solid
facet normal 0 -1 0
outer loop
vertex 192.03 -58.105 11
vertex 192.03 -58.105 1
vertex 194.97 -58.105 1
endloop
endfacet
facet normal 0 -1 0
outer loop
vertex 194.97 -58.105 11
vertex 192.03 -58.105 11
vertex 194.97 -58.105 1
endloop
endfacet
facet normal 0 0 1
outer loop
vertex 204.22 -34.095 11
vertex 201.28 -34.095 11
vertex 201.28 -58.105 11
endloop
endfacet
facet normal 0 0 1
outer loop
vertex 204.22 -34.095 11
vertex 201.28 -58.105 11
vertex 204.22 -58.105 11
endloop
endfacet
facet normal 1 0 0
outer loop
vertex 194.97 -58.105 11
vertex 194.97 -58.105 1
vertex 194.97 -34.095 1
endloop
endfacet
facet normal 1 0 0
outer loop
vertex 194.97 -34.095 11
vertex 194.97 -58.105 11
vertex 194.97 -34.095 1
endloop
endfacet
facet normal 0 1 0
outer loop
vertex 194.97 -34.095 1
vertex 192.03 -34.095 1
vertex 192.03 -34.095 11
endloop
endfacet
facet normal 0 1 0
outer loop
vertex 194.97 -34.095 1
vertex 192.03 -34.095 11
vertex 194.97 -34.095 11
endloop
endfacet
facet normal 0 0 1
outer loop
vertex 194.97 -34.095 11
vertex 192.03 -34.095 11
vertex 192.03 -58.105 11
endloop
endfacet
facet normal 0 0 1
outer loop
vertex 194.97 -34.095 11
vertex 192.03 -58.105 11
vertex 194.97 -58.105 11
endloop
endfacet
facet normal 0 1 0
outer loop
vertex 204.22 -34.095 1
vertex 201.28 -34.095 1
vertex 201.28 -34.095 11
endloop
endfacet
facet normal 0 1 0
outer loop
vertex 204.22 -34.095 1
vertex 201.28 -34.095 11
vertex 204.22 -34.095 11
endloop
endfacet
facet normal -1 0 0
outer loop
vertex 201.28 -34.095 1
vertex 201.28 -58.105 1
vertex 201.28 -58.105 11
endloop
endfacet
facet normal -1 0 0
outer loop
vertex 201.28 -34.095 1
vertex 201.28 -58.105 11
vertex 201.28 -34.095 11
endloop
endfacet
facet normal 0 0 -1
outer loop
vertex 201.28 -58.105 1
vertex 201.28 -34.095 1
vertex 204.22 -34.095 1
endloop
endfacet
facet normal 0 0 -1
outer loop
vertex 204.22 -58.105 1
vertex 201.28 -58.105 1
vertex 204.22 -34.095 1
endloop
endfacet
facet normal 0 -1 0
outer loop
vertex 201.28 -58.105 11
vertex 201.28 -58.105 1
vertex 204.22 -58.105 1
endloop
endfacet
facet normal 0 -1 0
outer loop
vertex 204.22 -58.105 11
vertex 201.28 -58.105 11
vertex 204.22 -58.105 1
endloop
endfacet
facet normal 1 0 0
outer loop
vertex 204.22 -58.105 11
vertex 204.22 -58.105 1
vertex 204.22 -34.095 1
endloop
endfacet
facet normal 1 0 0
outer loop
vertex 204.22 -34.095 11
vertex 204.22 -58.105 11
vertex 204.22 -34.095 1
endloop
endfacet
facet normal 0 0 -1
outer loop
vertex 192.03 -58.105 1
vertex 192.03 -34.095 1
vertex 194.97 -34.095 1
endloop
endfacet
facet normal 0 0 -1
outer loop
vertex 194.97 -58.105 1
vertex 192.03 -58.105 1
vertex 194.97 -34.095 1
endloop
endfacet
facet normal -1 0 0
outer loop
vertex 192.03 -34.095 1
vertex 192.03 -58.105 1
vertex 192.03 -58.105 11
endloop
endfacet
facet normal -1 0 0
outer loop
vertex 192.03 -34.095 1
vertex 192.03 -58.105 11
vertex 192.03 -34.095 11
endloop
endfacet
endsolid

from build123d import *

# Parameters (mm, degrees)
AUFSATZ_LINEAR_START              = 1
SKIZZE1_W                         = 2.94
SKIZZE1_H                         = 24.01
AUFSATZ_LINEAR_AUSTRAGEN1_DEPTH   = 10
AUFSATZ_LINEAR_AUSTRAGEN1_2_DEPTH = 10


with BuildPart() as part:
    # Skizze1 → Aufsatz-Linear austragen1 (new body)
    with BuildSketch(Plane.XY.offset(AUFSATZ_LINEAR_START)):
        with Locations((193.5, -46.1)):
            Rectangle(SKIZZE1_W, SKIZZE1_H)
    extrude(amount=AUFSATZ_LINEAR_AUSTRAGEN1_DEPTH)


with BuildPart() as body_2:
    # Skizze1 → Aufsatz-Linear austragen1 2 (new body)
    with BuildSketch(Plane.XY.offset(AUFSATZ_LINEAR_START)):
        with Locations((202.75, -46.1)):
            Rectangle(SKIZZE1_W, SKIZZE1_H)
    extrude(amount=AUFSATZ_LINEAR_AUSTRAGEN1_2_DEPTH)


solid = Compound([part.part, body_2.part])
